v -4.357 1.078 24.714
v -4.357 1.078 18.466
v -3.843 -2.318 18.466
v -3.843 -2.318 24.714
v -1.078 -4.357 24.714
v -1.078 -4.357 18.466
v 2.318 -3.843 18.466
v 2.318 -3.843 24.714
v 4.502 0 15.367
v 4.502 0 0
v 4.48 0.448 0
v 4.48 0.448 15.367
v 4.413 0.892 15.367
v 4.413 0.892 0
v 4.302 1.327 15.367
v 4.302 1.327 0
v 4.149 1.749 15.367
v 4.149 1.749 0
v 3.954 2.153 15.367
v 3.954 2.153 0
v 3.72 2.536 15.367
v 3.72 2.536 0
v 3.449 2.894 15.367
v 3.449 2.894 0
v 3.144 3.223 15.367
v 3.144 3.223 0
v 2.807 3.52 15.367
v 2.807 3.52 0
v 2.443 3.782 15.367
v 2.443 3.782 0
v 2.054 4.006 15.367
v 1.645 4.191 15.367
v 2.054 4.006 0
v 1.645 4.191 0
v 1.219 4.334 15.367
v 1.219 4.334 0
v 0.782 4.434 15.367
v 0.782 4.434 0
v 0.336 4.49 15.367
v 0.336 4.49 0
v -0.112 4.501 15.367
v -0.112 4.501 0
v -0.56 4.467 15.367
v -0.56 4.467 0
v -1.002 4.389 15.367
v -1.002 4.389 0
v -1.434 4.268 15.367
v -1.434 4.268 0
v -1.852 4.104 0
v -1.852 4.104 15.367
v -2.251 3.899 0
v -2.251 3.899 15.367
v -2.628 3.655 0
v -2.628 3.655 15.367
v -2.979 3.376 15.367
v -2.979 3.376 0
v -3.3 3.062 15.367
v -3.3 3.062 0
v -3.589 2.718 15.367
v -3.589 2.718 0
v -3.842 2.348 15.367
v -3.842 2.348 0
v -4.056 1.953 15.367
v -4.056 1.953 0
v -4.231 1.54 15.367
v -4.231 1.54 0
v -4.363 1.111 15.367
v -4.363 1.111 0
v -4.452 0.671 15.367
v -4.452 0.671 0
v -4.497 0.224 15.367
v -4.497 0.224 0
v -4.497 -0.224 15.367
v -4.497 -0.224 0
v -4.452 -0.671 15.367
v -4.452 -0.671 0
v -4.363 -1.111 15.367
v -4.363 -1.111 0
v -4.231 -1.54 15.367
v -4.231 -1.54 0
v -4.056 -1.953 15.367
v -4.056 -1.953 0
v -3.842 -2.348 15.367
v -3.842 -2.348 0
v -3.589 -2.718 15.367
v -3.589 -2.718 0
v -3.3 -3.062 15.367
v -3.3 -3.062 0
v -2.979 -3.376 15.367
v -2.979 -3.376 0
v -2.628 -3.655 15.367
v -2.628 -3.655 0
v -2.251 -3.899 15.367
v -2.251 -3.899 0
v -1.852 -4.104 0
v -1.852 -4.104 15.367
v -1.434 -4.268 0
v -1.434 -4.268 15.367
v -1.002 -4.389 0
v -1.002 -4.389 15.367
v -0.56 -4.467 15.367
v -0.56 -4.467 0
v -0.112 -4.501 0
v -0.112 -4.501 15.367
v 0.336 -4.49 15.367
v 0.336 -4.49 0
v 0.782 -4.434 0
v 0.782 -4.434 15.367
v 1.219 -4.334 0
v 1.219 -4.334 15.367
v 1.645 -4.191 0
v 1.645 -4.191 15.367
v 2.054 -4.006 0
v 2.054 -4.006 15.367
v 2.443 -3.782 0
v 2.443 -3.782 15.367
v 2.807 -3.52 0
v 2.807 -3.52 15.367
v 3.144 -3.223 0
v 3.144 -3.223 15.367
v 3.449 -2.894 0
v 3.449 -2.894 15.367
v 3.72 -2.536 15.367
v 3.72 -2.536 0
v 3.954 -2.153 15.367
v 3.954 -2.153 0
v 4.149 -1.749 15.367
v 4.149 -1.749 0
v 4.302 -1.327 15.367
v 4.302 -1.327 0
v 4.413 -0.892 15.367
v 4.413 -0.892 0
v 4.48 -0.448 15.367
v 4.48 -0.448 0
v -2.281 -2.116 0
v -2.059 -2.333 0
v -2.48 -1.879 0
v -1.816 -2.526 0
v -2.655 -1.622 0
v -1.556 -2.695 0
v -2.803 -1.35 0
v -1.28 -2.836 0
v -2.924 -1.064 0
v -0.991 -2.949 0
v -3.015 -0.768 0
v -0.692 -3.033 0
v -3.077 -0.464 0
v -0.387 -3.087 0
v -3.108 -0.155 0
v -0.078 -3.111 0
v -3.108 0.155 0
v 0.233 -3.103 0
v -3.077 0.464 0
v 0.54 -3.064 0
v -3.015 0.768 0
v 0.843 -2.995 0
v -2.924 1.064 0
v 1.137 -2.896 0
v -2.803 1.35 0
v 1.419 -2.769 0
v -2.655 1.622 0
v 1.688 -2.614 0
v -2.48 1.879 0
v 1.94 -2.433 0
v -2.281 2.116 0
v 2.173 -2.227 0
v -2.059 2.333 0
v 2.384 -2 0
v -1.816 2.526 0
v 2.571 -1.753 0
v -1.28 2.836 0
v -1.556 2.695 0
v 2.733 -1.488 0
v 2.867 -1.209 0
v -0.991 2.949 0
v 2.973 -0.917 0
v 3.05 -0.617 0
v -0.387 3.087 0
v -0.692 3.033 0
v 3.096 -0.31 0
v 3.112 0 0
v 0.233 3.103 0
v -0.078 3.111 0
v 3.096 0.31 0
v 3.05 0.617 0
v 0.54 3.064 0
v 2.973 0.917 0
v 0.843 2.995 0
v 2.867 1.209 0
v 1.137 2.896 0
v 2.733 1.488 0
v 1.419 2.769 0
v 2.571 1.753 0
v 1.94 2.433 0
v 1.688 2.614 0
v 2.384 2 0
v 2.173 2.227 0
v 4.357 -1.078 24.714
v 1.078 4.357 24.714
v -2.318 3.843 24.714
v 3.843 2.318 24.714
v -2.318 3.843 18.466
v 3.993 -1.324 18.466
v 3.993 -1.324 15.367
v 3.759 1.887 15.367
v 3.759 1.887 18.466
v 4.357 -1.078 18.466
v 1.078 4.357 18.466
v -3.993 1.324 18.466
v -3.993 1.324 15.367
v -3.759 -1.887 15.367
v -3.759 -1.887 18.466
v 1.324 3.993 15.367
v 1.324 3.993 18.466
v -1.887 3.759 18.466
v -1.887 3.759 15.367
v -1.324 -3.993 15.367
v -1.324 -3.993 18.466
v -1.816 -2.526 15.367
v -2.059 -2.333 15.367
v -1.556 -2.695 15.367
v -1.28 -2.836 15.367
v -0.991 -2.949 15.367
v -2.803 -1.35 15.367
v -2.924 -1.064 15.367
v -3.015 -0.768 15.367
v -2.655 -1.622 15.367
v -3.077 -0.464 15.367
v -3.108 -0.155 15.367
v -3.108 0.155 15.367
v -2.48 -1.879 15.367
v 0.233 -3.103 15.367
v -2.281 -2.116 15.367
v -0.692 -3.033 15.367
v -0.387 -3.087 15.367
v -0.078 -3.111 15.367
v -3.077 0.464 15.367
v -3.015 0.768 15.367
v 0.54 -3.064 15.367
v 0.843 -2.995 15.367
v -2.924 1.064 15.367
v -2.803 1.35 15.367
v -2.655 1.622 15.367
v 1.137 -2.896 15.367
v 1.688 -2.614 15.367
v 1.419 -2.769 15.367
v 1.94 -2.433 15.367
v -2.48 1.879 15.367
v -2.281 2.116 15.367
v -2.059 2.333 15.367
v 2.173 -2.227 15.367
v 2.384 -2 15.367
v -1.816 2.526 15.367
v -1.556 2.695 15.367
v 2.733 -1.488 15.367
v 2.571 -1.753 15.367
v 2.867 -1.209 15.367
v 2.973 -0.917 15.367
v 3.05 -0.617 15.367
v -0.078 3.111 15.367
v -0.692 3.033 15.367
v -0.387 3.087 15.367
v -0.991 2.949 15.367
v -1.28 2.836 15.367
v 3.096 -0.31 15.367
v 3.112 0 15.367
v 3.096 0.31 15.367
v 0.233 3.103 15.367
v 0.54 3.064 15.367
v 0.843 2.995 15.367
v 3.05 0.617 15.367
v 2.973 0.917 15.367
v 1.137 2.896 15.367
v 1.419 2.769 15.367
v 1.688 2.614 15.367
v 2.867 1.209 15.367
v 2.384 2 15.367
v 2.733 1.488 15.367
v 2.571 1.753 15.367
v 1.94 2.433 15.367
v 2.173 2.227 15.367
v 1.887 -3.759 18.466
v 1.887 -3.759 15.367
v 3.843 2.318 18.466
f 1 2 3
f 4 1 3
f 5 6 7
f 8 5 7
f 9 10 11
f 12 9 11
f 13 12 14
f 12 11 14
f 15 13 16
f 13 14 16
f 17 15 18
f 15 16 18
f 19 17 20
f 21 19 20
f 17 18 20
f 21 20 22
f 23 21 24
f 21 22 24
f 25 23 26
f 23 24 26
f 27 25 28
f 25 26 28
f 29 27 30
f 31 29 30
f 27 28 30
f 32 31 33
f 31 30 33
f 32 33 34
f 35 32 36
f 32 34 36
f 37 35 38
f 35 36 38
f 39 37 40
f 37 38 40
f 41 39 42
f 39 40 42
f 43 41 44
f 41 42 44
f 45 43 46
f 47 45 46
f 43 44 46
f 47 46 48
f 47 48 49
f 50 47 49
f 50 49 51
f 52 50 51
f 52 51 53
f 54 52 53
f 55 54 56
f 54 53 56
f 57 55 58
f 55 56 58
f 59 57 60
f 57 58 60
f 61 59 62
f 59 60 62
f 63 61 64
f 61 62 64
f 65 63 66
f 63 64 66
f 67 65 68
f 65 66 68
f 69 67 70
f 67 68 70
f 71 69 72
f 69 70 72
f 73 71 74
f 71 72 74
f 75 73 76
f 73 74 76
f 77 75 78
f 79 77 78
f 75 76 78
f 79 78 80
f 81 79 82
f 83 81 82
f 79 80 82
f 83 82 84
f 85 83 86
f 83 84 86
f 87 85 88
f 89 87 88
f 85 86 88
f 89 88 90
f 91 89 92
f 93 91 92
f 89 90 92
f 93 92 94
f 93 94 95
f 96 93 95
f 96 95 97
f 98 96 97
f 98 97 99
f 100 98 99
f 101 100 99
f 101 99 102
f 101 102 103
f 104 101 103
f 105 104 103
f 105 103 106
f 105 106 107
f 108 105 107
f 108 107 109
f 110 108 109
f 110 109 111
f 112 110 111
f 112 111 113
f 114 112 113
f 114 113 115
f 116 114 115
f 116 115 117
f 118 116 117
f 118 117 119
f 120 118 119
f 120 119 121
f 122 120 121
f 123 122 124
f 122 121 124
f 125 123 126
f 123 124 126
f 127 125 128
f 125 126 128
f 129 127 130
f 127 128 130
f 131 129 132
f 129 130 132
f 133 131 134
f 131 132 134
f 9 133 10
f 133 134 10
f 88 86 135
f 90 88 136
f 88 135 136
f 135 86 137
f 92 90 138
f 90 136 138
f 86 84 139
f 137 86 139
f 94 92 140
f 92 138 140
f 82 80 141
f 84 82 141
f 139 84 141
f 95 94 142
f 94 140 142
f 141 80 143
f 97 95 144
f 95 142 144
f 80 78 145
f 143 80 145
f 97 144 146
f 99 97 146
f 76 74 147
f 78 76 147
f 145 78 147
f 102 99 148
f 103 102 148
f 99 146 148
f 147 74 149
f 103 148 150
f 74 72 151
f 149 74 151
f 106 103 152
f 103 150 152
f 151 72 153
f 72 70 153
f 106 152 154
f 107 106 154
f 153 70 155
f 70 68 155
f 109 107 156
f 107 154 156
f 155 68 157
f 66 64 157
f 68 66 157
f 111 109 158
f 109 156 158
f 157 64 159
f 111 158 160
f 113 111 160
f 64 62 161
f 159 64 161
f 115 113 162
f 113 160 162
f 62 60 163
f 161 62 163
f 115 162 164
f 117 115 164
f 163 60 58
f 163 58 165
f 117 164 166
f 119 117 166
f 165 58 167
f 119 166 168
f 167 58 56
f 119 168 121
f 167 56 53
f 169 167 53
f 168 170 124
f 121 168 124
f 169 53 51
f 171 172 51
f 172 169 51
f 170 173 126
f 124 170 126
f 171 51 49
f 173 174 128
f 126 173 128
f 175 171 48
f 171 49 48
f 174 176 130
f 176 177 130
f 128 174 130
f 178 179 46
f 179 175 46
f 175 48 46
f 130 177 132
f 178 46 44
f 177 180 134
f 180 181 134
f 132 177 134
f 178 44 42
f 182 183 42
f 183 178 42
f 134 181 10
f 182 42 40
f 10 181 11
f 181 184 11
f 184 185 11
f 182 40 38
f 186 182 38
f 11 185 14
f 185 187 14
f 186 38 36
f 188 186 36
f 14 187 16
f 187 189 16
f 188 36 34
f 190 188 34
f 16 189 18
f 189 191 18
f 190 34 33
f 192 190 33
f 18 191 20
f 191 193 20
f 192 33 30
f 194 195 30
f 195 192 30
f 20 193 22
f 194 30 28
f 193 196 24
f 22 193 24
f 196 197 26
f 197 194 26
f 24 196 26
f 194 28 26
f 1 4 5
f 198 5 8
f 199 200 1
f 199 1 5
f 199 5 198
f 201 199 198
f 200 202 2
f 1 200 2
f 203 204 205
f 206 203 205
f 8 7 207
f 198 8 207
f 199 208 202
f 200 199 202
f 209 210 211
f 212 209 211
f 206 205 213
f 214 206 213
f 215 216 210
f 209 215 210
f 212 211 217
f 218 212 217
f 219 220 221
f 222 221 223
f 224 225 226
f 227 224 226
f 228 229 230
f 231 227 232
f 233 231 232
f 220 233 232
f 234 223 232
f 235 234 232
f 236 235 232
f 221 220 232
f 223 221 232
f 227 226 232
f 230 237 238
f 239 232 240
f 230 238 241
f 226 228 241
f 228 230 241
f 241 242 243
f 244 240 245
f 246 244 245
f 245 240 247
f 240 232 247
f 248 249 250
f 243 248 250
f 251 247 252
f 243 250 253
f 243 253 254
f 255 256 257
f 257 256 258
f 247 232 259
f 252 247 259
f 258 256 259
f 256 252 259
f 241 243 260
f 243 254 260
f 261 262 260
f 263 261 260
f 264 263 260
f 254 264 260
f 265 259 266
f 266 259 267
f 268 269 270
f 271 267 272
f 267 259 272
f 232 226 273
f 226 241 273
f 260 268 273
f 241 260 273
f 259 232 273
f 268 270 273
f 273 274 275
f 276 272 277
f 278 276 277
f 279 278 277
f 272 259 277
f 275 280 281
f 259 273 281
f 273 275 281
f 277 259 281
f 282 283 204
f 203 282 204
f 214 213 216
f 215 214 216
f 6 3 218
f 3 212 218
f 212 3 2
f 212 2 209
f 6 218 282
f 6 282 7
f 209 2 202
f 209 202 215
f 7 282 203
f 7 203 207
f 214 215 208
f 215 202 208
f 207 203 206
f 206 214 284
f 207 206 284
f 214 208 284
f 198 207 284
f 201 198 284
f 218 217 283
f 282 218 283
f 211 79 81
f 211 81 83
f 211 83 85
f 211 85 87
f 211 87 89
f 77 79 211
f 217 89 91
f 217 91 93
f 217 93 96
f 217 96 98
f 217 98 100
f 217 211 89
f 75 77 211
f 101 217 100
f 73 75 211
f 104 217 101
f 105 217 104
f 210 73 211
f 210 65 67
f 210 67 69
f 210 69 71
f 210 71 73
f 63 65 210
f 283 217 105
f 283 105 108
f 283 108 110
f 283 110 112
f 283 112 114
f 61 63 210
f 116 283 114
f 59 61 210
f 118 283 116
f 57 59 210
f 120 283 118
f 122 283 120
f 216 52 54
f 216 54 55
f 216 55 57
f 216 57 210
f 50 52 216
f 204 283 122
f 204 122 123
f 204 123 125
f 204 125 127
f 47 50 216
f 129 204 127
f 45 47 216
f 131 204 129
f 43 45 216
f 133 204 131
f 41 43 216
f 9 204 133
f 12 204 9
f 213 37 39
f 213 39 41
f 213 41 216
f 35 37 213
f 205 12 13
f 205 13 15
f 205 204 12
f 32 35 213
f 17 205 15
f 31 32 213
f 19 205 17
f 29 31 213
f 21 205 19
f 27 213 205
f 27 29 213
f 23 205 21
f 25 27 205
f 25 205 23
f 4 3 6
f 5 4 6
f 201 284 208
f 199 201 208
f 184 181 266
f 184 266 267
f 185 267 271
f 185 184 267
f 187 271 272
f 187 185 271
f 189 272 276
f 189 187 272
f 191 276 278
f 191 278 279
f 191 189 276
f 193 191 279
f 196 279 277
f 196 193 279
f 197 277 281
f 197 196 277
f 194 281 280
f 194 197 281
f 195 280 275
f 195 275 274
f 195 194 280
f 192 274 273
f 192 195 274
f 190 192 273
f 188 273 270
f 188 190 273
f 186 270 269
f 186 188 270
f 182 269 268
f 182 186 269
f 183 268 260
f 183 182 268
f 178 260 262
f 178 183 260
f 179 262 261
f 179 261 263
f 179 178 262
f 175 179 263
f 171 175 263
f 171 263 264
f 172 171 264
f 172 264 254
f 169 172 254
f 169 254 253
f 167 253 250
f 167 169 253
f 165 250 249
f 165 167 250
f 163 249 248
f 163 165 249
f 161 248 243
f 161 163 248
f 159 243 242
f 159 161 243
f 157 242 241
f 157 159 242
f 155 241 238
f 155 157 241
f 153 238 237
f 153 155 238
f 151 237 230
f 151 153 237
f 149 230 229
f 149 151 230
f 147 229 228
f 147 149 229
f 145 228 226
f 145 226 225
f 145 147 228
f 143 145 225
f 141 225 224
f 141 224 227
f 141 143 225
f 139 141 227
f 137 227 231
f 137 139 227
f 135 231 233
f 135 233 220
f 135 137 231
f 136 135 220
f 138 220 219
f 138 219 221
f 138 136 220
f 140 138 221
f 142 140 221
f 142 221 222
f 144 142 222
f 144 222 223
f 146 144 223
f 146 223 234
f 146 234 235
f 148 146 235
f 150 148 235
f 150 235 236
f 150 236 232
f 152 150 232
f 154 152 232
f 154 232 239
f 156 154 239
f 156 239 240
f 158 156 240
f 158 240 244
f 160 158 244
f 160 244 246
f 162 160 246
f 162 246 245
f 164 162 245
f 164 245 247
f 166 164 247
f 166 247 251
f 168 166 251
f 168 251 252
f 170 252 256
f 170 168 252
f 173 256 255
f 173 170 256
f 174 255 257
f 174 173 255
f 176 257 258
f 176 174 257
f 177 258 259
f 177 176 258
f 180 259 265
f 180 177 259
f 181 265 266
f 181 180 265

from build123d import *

# Parameters (mm, degrees)
SKETCH1_R           = 4.50215
SKETCH1_R_2         = 3.1115
BOSS_EXTRUDE2_DEPTH = 15.367
BOSS_EXTRUDE3_DEPTH = 3.0988
BOSS_EXTRUDE4_DEPTH = 6.2484


with BuildPart() as part:
    # Sketch1 → Boss-Extrude2 (new body)
    with BuildSketch(Plane.XY):
        Circle(SKETCH1_R)
        Circle(SKETCH1_R_2, mode=Mode.SUBTRACT)
    extrude(amount=BOSS_EXTRUDE2_DEPTH)

    # Sketch2 → Boss-Extrude3 (add)
    with BuildSketch(Plane.XY.offset(15.367)):
        Polygon((3.759424156, 1.886920364), (1.324060129, 3.992568499), (-1.886920364, 3.759424156), (-3.992568499, 1.324060129), (-3.759424156, -1.886920364), (-1.324060129, -3.992568499), (1.886920364, -3.759424156), (3.992568499, -1.324060129), align=None)
    extrude(amount=BOSS_EXTRUDE3_DEPTH)

    # Sketch3 → Boss-Extrude4 (add)
    with BuildSketch(Plane.XY.offset(18.4658)):
        Polygon((-2.318447564, 3.843004124), (-4.35680427, 1.078024282), (-3.843004124, -2.318447564), (-1.078024282, -4.35680427), (2.318447564, -3.843004124), (4.35680427, -1.078024282), (3.843004124, 2.318447564), (1.078024282, 4.35680427), align=None)
    extrude(amount=BOSS_EXTRUDE4_DEPTH)


solid = part.part
